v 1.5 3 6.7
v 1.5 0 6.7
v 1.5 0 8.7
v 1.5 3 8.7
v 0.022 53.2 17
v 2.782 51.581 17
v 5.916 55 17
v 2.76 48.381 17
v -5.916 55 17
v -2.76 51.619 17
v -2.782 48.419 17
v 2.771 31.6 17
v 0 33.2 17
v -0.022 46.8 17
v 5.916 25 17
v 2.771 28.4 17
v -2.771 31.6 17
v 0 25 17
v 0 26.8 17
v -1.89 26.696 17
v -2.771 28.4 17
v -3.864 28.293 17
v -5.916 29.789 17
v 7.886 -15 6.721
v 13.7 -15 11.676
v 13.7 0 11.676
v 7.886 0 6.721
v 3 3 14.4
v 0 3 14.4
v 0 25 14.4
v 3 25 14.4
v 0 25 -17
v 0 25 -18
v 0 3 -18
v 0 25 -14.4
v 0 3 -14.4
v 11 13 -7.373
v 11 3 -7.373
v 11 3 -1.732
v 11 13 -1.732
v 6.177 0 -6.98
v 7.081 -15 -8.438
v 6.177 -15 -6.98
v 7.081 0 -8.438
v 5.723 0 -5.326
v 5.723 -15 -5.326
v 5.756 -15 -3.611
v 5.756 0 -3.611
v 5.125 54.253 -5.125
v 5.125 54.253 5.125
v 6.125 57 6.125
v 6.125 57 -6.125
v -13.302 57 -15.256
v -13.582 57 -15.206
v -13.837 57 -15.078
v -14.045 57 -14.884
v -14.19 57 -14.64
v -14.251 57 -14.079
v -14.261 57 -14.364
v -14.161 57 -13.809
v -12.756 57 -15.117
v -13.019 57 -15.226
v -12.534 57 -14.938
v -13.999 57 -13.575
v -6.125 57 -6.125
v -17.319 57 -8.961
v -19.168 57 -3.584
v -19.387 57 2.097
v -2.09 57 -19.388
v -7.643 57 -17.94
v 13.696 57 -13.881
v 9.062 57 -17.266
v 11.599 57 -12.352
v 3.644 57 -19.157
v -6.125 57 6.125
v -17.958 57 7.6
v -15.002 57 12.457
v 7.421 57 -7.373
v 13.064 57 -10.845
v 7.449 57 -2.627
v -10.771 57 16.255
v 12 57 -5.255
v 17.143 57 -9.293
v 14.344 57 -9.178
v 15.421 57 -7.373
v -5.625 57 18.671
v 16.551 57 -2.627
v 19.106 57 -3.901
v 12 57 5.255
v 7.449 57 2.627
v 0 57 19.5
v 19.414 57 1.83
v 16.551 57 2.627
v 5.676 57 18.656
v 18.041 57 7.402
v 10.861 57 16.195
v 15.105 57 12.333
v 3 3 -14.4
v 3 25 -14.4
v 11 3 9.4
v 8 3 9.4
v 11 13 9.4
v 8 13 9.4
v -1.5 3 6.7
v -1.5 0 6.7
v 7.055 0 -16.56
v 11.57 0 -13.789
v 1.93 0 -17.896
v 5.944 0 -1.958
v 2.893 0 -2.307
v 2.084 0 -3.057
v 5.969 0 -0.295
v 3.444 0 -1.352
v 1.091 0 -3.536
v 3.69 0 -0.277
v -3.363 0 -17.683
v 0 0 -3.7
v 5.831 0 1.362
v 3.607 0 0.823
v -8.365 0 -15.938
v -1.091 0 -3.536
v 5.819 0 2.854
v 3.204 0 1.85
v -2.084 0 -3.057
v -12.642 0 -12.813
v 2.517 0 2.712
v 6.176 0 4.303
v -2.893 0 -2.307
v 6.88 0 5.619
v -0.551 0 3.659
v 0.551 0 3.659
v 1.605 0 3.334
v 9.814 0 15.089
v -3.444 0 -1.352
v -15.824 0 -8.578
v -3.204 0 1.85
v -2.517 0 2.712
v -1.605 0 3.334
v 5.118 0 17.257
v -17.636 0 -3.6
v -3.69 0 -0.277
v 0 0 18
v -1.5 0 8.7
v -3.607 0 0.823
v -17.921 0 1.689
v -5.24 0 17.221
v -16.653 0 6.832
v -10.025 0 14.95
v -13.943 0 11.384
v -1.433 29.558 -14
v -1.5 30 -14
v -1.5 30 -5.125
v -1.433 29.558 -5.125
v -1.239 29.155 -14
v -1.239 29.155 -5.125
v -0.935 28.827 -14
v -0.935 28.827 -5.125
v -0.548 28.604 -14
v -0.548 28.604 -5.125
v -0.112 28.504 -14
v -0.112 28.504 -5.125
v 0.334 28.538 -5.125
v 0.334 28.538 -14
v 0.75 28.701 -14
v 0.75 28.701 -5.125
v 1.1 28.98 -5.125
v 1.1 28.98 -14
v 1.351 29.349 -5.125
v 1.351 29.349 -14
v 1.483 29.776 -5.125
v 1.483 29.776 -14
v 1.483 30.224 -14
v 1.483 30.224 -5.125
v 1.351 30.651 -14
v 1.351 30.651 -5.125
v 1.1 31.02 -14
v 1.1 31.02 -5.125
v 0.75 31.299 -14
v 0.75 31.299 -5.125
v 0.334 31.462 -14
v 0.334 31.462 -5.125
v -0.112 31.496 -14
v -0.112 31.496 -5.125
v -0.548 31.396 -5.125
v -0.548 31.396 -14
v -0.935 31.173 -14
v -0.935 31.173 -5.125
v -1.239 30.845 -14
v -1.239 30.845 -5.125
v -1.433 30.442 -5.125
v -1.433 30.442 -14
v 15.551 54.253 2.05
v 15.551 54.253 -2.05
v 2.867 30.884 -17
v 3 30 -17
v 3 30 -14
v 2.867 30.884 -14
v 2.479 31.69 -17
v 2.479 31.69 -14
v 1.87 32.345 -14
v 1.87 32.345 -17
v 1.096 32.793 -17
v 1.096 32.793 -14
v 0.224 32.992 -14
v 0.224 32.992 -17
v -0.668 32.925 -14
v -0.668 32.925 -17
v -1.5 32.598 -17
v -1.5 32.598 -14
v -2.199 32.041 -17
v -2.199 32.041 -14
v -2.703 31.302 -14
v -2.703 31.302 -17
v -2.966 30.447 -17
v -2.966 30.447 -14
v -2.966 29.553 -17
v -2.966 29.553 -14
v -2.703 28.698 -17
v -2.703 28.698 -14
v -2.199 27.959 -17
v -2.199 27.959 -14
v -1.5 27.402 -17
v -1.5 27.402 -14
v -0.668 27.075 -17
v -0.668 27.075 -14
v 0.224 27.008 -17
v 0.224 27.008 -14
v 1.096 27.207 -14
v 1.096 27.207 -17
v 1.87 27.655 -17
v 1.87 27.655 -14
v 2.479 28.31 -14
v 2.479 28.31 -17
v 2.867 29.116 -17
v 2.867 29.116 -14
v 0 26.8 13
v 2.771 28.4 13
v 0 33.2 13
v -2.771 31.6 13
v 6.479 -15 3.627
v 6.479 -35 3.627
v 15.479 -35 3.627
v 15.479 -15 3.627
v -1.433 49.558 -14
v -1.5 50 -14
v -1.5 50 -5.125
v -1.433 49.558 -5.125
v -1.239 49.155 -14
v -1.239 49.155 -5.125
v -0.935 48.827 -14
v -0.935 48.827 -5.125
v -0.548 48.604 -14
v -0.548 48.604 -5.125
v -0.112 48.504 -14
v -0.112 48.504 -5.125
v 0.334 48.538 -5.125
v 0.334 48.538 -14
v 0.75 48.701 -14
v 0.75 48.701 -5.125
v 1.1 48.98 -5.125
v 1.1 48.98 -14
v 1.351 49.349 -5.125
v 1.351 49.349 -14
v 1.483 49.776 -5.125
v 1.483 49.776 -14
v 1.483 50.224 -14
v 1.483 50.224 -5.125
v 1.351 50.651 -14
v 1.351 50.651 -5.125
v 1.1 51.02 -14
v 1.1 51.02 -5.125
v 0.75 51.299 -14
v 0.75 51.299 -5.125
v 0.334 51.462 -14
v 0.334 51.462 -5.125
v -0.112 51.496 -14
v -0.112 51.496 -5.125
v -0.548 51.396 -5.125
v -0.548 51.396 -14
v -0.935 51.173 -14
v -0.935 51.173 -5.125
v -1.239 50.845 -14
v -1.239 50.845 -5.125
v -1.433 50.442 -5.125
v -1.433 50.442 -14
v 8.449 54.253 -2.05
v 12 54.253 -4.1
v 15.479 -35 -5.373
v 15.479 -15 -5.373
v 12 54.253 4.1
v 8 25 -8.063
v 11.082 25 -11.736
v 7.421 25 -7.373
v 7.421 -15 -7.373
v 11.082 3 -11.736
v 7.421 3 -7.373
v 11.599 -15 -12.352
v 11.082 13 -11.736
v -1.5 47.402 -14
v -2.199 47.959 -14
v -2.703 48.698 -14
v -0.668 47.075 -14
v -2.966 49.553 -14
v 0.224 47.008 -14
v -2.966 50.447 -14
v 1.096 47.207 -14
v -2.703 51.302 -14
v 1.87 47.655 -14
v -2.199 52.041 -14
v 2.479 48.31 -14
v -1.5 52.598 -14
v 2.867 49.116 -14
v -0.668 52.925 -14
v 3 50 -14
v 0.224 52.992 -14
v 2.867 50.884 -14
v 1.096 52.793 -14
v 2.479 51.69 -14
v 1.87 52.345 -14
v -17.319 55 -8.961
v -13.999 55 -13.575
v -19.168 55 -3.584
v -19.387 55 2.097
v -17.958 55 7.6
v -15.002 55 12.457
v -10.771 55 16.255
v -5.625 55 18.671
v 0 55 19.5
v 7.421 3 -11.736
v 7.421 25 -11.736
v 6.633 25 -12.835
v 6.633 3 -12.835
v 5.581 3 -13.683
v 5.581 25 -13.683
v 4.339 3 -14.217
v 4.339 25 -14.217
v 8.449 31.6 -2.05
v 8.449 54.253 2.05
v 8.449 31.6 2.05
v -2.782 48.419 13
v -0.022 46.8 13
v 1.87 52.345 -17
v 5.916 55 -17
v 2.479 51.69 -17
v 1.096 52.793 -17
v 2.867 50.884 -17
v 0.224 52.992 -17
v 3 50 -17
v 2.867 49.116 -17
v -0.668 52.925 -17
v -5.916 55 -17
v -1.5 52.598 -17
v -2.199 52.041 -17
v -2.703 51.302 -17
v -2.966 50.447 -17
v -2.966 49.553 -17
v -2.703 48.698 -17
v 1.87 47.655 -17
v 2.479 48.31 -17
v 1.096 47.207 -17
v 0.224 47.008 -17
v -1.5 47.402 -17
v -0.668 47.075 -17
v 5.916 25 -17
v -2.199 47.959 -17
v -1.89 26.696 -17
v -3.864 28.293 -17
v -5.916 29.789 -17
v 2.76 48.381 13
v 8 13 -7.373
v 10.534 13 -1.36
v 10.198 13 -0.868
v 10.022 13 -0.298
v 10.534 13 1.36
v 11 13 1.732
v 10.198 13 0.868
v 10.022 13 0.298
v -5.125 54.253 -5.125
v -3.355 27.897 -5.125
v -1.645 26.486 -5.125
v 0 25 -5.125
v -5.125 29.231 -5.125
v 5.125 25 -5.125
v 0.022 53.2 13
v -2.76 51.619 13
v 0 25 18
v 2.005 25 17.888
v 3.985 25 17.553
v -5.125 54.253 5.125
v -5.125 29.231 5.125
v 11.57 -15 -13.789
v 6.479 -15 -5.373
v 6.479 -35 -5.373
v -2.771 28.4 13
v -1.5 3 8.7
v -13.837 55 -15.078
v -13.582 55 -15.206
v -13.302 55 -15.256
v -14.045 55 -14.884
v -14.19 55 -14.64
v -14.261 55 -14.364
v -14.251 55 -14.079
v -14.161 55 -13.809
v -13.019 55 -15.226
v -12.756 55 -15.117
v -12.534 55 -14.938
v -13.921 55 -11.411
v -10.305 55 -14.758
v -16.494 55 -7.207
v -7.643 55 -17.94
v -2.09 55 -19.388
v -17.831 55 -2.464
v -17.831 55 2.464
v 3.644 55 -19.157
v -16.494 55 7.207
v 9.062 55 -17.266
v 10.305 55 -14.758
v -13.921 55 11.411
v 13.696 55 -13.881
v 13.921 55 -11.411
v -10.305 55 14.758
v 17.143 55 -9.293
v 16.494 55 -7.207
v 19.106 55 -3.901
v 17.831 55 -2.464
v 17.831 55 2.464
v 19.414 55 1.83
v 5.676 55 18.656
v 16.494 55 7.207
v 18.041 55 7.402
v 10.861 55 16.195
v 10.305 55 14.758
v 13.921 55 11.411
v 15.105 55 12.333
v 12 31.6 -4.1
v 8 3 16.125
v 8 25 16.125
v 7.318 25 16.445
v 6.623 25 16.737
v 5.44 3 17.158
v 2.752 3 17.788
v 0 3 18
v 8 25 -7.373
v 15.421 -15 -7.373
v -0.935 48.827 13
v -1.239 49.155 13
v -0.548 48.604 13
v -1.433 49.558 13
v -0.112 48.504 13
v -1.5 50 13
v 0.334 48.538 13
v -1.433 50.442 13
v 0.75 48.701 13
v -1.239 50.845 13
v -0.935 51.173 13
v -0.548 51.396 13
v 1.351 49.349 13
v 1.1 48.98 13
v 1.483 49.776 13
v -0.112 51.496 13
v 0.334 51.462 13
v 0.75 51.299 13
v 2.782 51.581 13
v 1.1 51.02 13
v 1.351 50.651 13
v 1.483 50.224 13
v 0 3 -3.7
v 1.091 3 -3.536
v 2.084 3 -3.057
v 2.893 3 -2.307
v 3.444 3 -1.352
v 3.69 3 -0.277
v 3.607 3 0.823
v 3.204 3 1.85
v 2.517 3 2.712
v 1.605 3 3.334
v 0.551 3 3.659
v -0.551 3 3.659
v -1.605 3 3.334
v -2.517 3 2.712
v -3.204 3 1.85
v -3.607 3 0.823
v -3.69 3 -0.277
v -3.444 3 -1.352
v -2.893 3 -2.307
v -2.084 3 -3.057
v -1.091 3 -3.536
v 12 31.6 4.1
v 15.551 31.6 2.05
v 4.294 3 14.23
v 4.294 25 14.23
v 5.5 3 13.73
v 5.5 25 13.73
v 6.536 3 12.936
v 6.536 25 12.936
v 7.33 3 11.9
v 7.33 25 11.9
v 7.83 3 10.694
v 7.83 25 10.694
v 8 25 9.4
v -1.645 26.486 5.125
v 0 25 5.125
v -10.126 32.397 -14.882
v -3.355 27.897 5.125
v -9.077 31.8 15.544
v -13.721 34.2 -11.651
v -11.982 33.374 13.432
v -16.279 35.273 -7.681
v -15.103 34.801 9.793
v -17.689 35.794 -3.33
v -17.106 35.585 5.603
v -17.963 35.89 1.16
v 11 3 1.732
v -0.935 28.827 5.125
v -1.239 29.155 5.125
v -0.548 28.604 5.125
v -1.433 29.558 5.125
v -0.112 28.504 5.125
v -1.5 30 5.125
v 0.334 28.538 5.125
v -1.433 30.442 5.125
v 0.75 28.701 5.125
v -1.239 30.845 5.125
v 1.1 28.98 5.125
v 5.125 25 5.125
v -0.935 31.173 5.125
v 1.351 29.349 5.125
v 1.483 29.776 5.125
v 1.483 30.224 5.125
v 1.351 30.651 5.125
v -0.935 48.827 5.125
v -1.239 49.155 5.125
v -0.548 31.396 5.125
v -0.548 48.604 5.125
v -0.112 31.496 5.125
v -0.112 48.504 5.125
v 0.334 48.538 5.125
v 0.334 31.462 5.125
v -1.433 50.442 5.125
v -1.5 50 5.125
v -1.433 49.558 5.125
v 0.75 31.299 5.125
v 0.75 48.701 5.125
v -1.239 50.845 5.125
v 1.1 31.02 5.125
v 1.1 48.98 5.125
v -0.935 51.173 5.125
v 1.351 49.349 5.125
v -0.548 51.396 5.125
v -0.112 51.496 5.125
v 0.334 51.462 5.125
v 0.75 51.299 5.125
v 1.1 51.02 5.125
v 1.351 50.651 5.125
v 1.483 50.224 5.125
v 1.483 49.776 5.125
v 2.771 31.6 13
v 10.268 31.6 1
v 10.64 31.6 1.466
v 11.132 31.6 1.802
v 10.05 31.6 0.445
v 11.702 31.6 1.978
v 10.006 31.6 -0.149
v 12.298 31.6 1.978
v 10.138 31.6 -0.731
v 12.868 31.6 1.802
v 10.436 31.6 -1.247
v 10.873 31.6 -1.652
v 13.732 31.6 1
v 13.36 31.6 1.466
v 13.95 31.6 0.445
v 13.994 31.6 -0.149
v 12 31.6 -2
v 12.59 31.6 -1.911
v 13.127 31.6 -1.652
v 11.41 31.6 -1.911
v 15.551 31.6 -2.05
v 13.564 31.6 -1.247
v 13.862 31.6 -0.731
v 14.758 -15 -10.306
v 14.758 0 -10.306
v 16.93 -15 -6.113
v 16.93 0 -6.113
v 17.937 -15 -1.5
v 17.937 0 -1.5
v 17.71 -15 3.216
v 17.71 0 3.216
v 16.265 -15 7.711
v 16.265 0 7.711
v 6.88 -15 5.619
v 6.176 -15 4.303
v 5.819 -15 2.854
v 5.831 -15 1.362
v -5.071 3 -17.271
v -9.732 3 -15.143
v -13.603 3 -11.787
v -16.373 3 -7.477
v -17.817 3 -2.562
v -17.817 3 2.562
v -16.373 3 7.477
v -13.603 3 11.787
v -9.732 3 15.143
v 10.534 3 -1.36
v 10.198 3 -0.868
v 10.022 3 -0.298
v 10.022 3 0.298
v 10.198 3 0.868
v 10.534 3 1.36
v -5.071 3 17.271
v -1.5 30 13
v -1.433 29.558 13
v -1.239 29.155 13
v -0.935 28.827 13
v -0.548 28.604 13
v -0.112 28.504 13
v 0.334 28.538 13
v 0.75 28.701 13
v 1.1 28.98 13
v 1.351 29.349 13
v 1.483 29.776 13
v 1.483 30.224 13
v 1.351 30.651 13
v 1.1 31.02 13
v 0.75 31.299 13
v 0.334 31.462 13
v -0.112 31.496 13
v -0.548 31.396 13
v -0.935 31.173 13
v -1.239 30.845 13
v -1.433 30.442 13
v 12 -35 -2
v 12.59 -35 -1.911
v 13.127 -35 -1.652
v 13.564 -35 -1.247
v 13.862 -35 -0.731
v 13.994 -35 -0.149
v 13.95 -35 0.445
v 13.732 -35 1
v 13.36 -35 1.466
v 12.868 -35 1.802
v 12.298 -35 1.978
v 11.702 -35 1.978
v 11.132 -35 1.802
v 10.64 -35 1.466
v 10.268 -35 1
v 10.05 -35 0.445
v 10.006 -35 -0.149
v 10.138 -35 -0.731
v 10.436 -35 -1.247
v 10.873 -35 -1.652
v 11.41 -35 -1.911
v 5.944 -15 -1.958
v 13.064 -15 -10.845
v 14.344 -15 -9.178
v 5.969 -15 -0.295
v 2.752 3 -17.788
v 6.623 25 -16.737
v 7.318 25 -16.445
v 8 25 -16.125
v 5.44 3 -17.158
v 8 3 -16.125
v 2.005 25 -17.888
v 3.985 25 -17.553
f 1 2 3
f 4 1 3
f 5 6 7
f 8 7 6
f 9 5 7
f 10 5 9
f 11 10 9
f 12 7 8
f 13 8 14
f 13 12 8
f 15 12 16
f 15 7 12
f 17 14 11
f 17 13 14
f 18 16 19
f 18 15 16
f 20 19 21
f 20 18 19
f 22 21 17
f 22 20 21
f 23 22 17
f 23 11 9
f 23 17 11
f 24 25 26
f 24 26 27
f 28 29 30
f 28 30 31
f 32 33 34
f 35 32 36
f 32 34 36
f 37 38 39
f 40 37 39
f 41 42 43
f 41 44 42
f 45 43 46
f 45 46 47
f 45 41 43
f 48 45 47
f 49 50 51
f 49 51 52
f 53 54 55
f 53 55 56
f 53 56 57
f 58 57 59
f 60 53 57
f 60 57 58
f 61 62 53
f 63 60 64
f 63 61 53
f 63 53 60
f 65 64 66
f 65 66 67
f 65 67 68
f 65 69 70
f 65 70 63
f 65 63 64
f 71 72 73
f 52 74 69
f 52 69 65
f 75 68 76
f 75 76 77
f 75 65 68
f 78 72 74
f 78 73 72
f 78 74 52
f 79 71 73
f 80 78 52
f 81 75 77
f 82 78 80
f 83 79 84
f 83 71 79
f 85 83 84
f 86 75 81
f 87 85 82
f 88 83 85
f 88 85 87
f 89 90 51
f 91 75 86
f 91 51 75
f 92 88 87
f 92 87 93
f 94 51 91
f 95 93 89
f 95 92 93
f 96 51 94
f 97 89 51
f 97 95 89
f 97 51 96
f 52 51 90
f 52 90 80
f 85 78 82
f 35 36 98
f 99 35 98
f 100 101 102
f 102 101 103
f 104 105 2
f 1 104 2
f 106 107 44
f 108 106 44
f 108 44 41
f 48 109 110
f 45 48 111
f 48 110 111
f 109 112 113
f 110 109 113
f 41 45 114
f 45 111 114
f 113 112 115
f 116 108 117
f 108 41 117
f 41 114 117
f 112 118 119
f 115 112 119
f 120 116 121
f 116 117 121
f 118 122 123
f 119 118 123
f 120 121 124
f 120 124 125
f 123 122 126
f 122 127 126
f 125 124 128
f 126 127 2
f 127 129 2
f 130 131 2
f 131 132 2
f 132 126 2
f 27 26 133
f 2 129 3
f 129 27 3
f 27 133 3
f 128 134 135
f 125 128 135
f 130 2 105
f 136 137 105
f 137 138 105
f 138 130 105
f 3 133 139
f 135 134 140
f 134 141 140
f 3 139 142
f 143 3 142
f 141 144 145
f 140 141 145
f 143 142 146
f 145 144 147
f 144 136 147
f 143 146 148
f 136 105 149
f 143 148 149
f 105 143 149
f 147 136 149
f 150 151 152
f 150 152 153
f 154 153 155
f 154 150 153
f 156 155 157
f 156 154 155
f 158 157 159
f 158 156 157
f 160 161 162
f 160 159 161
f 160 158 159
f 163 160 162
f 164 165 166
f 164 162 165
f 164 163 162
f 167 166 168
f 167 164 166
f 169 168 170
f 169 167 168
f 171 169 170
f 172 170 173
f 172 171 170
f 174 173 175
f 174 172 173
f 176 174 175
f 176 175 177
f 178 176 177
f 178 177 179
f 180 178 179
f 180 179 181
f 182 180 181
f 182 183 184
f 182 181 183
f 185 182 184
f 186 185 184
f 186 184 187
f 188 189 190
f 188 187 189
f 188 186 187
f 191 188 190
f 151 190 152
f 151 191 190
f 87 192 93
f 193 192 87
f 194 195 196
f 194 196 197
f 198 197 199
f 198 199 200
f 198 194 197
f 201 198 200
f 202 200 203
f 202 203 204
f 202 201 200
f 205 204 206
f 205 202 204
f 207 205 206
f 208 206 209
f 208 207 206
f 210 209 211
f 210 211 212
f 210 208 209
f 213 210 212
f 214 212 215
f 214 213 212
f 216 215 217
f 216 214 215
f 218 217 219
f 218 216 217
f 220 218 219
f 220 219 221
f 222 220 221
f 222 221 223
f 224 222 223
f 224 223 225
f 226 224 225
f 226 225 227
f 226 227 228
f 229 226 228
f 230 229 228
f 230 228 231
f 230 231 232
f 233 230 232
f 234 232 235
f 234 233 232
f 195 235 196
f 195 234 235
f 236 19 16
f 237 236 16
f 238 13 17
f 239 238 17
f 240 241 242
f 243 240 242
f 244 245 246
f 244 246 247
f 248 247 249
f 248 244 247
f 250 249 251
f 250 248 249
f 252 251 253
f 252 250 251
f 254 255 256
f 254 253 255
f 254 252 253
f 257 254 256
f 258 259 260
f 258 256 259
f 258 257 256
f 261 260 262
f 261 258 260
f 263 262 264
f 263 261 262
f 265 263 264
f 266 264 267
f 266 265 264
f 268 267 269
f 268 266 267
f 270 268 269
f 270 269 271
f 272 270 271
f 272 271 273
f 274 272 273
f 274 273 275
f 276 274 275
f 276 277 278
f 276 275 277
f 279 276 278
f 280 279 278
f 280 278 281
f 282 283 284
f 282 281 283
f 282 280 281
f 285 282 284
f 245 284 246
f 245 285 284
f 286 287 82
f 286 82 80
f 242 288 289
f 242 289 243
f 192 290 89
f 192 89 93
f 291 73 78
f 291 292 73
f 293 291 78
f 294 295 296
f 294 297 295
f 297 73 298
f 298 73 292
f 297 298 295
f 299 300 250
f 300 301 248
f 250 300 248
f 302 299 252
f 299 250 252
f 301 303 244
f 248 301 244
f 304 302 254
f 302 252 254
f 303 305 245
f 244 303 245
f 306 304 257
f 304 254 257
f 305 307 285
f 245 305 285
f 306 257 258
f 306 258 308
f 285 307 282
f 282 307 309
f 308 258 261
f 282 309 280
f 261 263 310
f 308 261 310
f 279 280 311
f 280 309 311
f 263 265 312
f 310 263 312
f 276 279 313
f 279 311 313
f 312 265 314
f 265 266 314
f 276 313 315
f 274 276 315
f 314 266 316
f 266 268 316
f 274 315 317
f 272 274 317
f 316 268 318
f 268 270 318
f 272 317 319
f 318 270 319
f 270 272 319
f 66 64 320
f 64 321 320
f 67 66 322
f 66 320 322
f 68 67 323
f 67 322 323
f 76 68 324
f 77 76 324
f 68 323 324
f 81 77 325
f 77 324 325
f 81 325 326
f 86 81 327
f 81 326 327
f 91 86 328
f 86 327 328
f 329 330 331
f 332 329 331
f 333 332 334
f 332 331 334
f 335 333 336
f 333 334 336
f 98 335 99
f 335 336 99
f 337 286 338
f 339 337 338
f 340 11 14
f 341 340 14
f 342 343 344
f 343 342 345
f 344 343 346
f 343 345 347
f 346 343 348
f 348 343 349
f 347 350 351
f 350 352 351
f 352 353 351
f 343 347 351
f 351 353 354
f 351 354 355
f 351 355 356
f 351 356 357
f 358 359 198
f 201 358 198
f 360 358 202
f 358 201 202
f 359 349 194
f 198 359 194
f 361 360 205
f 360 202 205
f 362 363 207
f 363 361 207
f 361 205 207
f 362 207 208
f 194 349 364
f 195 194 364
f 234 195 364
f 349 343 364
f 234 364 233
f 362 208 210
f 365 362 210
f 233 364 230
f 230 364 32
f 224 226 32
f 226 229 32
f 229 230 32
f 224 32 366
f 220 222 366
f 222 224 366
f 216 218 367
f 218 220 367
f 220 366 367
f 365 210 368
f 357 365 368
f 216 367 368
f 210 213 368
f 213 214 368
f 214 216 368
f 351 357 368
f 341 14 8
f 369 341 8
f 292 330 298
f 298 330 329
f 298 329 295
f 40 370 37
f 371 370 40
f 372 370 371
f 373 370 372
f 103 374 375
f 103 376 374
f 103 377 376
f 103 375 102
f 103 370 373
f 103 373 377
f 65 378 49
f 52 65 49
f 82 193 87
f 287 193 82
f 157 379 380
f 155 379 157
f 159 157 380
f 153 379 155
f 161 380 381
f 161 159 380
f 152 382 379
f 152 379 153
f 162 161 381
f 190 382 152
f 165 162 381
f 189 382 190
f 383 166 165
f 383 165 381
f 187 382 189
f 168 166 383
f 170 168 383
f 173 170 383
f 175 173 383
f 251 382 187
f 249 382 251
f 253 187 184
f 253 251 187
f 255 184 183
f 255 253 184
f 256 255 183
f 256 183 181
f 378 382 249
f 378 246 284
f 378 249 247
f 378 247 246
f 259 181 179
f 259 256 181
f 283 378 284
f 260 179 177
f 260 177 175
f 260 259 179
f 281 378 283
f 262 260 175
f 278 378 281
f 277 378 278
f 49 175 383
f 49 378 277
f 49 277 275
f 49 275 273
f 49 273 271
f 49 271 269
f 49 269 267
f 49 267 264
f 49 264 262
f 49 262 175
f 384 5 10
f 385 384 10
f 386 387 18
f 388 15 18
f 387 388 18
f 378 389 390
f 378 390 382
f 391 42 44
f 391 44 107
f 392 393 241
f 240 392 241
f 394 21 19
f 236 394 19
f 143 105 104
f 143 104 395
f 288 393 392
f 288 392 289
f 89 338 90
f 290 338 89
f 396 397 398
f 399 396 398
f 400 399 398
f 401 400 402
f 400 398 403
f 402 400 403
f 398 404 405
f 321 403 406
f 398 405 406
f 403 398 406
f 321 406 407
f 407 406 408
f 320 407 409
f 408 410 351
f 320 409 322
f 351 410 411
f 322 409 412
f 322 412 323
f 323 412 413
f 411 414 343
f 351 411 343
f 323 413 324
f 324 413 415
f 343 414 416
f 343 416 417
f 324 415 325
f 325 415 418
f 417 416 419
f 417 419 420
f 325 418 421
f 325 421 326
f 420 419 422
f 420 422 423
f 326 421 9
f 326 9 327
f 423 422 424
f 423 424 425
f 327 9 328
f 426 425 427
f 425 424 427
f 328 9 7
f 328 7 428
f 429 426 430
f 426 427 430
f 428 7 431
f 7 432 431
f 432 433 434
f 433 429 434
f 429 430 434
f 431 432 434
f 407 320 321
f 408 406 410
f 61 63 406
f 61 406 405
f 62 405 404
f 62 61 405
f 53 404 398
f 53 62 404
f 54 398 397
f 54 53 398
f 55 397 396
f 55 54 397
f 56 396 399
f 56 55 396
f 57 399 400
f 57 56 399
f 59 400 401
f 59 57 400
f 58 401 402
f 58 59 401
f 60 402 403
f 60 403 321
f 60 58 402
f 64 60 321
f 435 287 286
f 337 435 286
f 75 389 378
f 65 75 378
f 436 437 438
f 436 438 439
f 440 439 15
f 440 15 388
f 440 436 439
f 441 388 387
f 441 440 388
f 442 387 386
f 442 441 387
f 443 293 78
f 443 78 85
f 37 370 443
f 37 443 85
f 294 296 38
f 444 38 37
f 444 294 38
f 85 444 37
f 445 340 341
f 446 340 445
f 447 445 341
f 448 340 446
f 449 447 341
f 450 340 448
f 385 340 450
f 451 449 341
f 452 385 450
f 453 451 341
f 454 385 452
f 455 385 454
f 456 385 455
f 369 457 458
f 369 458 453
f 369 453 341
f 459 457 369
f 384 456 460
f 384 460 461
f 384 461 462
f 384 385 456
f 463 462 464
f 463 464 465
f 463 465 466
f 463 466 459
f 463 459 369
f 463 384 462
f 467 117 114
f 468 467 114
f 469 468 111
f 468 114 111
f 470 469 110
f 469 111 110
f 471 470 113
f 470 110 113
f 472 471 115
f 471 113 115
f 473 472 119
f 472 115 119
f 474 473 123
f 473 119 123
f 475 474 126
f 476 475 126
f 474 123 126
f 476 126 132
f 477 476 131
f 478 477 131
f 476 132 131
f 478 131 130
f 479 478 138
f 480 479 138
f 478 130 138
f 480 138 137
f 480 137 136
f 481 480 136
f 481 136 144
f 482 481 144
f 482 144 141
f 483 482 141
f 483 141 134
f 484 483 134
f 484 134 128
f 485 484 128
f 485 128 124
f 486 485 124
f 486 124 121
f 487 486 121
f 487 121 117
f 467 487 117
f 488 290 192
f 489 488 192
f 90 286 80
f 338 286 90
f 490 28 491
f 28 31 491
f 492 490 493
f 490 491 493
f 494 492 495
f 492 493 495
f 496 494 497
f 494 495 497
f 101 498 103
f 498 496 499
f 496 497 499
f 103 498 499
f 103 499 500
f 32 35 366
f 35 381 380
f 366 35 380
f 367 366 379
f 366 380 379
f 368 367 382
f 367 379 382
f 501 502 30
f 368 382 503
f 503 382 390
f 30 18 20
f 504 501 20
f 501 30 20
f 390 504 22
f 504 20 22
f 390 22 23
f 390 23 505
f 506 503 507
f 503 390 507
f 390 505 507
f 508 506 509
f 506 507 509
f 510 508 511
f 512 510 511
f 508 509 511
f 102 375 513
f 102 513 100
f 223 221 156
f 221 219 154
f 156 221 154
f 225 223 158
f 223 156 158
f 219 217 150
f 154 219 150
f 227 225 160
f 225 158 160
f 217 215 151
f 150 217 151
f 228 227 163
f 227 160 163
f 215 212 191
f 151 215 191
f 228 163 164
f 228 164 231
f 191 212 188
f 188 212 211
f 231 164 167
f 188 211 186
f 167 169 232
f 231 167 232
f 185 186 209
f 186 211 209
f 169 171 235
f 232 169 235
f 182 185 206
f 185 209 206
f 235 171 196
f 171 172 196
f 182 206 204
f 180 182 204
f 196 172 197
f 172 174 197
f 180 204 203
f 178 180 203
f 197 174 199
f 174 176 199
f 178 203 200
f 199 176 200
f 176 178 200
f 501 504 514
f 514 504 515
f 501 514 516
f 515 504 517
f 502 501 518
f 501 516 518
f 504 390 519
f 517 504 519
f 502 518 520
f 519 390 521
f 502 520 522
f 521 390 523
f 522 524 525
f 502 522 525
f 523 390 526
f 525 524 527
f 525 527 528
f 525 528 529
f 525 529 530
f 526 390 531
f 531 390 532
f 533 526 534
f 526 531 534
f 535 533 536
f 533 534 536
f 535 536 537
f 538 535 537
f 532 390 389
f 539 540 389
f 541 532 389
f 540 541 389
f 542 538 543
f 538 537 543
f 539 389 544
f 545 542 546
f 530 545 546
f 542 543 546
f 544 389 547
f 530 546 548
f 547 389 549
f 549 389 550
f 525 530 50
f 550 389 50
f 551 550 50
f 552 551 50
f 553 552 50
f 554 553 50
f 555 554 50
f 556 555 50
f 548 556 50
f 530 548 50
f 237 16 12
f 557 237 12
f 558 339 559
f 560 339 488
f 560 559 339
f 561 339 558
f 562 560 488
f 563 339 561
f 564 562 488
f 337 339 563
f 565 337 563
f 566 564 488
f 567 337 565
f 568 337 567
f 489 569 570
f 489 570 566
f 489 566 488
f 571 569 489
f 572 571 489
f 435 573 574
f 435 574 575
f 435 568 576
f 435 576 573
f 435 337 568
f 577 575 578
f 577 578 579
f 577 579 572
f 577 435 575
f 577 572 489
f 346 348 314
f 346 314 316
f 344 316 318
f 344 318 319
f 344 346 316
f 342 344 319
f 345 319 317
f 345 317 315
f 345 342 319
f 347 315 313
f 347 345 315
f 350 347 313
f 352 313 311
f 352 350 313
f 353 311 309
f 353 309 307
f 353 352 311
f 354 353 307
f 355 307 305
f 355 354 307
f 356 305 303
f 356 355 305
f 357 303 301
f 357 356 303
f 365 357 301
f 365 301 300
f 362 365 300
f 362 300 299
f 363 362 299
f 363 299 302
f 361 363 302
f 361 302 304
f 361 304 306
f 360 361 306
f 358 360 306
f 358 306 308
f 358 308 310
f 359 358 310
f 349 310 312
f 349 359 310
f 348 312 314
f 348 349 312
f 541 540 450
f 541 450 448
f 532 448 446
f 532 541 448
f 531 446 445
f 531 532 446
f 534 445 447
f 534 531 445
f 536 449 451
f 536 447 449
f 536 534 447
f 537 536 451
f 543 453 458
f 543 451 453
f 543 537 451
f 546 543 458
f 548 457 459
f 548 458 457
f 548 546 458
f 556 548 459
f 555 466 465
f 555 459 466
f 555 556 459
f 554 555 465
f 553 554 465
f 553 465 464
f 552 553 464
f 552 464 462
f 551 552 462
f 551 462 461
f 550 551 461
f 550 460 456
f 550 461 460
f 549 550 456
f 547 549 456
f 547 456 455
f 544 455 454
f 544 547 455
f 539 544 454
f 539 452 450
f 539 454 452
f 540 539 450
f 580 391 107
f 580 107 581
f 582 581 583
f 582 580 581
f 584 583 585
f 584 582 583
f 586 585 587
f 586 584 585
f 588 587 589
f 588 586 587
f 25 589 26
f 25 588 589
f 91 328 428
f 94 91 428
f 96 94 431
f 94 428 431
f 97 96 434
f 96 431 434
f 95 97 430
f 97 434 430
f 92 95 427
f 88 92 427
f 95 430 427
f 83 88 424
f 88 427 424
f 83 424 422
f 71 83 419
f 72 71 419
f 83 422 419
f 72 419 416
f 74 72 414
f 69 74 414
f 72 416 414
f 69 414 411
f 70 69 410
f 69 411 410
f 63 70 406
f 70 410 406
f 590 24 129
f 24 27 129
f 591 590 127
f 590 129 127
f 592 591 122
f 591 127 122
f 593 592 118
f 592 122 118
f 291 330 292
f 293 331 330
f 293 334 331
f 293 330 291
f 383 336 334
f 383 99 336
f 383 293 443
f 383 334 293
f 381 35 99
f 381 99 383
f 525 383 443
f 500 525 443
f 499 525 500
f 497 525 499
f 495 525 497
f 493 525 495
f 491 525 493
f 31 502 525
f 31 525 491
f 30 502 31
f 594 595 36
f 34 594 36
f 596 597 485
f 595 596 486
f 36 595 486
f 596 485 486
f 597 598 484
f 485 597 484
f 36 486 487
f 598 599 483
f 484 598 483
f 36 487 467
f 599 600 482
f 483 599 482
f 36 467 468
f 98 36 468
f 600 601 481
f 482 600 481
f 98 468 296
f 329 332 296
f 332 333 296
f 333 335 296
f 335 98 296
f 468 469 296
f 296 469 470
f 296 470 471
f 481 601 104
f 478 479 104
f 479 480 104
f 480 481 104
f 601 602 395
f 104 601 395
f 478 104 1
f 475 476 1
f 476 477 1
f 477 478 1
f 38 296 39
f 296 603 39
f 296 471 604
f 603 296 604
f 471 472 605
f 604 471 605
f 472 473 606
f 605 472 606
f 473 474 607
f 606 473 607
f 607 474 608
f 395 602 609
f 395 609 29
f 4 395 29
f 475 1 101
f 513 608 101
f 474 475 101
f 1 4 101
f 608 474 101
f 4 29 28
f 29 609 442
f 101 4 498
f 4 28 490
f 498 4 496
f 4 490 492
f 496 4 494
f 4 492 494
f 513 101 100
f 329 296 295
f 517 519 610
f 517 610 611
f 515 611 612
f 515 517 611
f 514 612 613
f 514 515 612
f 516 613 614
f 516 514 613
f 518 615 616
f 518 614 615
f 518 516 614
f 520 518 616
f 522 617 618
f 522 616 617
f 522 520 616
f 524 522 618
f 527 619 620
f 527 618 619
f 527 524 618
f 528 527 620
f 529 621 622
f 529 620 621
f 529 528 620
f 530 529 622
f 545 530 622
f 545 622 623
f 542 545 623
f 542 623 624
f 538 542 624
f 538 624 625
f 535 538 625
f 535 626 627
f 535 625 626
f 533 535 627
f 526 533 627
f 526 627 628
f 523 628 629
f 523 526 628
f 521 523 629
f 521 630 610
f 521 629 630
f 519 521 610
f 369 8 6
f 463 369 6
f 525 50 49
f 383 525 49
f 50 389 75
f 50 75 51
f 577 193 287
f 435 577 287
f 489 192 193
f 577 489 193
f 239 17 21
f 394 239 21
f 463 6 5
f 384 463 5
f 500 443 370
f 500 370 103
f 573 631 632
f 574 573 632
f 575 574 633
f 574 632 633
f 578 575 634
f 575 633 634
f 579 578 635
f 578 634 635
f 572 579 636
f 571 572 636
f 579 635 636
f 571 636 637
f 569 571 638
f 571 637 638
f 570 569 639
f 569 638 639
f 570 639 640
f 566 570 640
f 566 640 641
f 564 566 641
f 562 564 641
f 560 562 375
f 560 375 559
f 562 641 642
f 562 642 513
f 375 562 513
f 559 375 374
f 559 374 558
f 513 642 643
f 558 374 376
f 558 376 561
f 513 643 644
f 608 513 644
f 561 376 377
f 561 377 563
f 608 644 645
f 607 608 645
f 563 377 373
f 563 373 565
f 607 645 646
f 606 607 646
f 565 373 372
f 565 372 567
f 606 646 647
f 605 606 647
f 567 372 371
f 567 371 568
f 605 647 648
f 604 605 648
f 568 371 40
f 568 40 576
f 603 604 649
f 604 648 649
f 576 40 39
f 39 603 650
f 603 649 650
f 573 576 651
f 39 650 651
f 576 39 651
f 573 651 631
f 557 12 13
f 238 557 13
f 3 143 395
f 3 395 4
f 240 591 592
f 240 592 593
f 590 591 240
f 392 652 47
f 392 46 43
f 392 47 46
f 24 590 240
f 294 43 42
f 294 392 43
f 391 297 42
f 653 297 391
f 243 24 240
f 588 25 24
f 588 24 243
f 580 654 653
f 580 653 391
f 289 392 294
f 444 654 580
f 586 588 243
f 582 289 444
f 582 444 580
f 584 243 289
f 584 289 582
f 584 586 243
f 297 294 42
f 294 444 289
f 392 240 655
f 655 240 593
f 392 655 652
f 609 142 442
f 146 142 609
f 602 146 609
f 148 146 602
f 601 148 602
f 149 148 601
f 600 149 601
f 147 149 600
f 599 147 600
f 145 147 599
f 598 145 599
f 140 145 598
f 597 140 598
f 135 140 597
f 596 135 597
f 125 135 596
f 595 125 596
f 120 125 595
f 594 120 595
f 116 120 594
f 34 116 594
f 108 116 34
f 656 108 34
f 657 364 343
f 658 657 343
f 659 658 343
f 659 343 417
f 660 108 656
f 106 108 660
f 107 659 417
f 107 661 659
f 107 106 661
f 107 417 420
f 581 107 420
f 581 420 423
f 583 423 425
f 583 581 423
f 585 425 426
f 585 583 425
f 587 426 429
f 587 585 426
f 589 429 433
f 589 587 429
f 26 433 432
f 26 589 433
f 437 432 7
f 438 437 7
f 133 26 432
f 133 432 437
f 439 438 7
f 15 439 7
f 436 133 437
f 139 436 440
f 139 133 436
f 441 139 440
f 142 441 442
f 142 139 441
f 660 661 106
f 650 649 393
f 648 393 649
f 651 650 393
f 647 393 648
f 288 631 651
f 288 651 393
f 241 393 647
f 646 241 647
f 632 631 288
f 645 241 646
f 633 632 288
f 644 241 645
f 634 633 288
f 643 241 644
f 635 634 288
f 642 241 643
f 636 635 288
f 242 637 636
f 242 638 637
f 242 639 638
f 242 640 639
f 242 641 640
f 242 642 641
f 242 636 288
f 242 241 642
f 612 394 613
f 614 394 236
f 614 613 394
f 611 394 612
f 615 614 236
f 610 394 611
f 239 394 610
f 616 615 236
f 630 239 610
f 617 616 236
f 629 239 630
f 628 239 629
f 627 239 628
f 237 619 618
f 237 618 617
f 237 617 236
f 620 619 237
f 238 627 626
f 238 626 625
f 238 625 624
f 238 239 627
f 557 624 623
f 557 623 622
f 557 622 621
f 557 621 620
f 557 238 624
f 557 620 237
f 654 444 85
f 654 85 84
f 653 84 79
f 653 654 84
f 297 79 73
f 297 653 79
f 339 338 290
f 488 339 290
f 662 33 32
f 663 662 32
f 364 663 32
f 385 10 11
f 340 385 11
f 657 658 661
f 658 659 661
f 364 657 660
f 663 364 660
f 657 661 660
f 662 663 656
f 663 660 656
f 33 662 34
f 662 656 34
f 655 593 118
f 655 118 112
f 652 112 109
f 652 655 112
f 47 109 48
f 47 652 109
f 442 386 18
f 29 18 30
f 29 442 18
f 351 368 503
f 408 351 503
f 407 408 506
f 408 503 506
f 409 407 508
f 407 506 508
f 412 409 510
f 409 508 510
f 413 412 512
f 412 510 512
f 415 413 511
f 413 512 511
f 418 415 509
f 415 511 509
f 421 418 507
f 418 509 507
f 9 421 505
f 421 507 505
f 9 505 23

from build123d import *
from build123d.topology import SkipClean

# Parameters (mm, degrees)
SKETCH_1_R          = 18
EXTRUDE_1_DEPTH     = 55
SKETCH_2_R          = 19.5
EXTRUDE_2_DEPTH     = 2
SKETCH_3_W          = 10.25
SKETCH_3_H          = 10.25
CUT_EXTRUDE_1_DEPTH = 40
EXTRUDE_START       = 15
EXTRUDE_3_DEPTH     = 15
BOSS_EXTRUDE1_START = 20
SKETCH1_R           = 18
BOSS_EXTRUDE1_DEPTH = 20
BOSS_EXTRUDE2_START = 7
SKETCH3_R           = 18
BOSS_EXTRUDE2_DEPTH = 7
SKETCH4_W           = 10.2
SKETCH4_H           = 10.2
CUT_EXTRUDE2_DEPTH  = 27
CUT_EXTRUDE4_DEPTH  = 25
BOSS_EXTRUDE3_DEPTH = 3
SKETCH9_W           = 36
SKETCH9_H           = 22
CUT_EXTRUDE5_DEPTH  = 8
SKETCH10_R          = 3.7
SKETCH10_W          = 3
SKETCH10_H          = 2
CUT_EXTRUDE6_DEPTH  = 10
SKETCH11_R          = 2
CUT_EXTRUDE7_DEPTH  = 102
SKETCH15_R          = 18
CUT_EXTRUDE9_DEPTH  = 27
CUT_EXTRUDE11_DEPTH = 30
SKETCH18_R          = 1.5
CUT_EXTRUDE12_DEPTH = 71.437915926
SKETCH19_R          = 3
CUT_EXTRUDE13_DEPTH = 3
BOSS_EXTRUDE5_DEPTH = 22
CUT_EXTRUDE16_DEPTH = 4
CUT_EXTRUDE17_DEPTH = 25.4
CUT_EXTRUDE18_DEPTH = 71.437915926
FILLET2_R           = 5
SKETCH30_W          = 18.8
SKETCH30_H          = 10
CUT_EXTRUDE20_DEPTH = 3
CHAMFER1_SIZE       = 1
CHAMFER1_SIZE2      = 2.747477419
CHAMFER2_SIZE       = 1
CHAMFER2_SIZE2      = 2.747477419
BOSS_EXTRUDE7_START = 20
SKETCH37_W          = 9
SKETCH37_H          = 9
SKETCH37_R          = 2
BOSS_EXTRUDE7_DEPTH = 20
CUT_EXTRUDE22_DEPTH = 15
CUT_EXTRUDE23_DEPTH = 78.100583655
SKETCH40_W          = 4.363156696
SKETCH40_H          = 4.363156696
CUT_EXTRUDE24_DEPTH = 10
FILLET7_R           = 6
BOSS_EXTRUDE8_DEPTH = 2
CUT_EXTRUDE25_DEPTH = 12


with BuildPart() as part:
    # Эскиз1 → Бобышка-Вытянуть1 (new body)
    with BuildSketch(Plane(origin=(0, 0, 0), x_dir=(1, 0, 0), z_dir=(0, 1, 0))):
        with Locations(Location((0, 0, 0), (0, 0, 270))):
            Circle(SKETCH_1_R)
    extrude(amount=EXTRUDE_1_DEPTH)

    # Эскиз2 → Бобышка-Вытянуть2 (add)
    with BuildSketch(Plane(origin=(0, 55, 0), x_dir=(1, 0, 0), z_dir=(0, 1, 0))):
        with Locations(Location((0, 0, 0), (0, 0, 270))):
            Circle(SKETCH_2_R)
    extrude(amount=EXTRUDE_2_DEPTH)

    # Эскиз3 → Вырез-Вытянуть1 (cut)
    with BuildSketch(Plane(origin=(0, 57, 0), x_dir=(1, 0, 0), z_dir=(0, 1, 0))):
        Rectangle(SKETCH_3_W, SKETCH_3_H)
    extrude(amount=-CUT_EXTRUDE_1_DEPTH, mode=Mode.SUBTRACT)

    # Эскиз4 → Бобышка-Вытянуть3 (add)
    with SkipClean():  # the faces are left unmerged after this step: merging them gives an invalid solid
        with BuildSketch(Plane.XZ.offset(EXTRUDE_START)):
            with BuildLine():
                Line((5.142300877, -6.128355545), (11.570176974, -13.788799976))
                ThreePointArc((11.570176974, -13.788799976), (17.937391115, -1.5), (13.69961987, 11.675633406))
                Line((13.69961987, 11.675633406), (5.142300877, 4.38257561))
                Line((5.142300877, 4.38257561), (5.142300877, -6.128355545))
            make_face()
        extrude(amount=-EXTRUDE_3_DEPTH)

    # Sketch1 → Boss-Extrude1 (add)
    with BuildSketch(Plane.XZ.offset(15).offset(BOSS_EXTRUDE1_START)):
        with Locations(Location((0, 0, 0), (0, 0, 270))):
            Circle(SKETCH1_R)
    extrude(amount=-BOSS_EXTRUDE1_DEPTH)

    # Sketch3 → Boss-Extrude2 (add)
    with BuildSketch(Plane.XZ.offset(35).offset(BOSS_EXTRUDE2_START)):
        with Locations(Location((0, 0, 0), (0, 0, 270))):
            Circle(SKETCH3_R)
    extrude(amount=-BOSS_EXTRUDE2_DEPTH)

    # Sketch4 → Cut-Extrude2 (cut)
    with BuildSketch(Plane.XZ.offset(42)):
        Rectangle(SKETCH4_W, SKETCH4_H)
    extrude(amount=-CUT_EXTRUDE2_DEPTH, mode=Mode.SUBTRACT)

    # Sketch6 → Cut-Extrude4 (cut)
    with BuildSketch(Plane.XZ):
        with BuildLine():
            Line((0, 18), (0, -18))
            ThreePointArc((0, -18), (-18, 0), (0, 18))
        make_face()
    extrude(amount=-CUT_EXTRUDE4_DEPTH, mode=Mode.SUBTRACT)

    # Sketch8 → Boss-Extrude3 (add)
    with BuildSketch(Plane.XZ):
        with BuildLine():
            Line((0, -18), (0, 18))
            ThreePointArc((0, 18), (-18, 0), (0, -18))
        make_face()
    extrude(amount=-BOSS_EXTRUDE3_DEPTH)

    # Sketch9 → Cut-Extrude5 (cut)
    with BuildSketch(Plane.ZY):
        with Locations((0, 14)):
            Rectangle(SKETCH9_W, SKETCH9_H)
    extrude(amount=-CUT_EXTRUDE5_DEPTH, mode=Mode.SUBTRACT)

    # Sketch10 → Cut-Extrude6 (cut)
    with BuildSketch(Plane.XZ):
        with Locations(Location((0, 0, 0), (0, 0, 270))):
            Circle(SKETCH10_R)
        with Locations((0, 7.7)):
            Rectangle(SKETCH10_W, SKETCH10_H)
    extrude(amount=-CUT_EXTRUDE6_DEPTH, mode=Mode.SUBTRACT)

    # Sketch11 → Cut-Extrude7 (cut)
    with BuildSketch(Plane.XZ.offset(42)):
        with Locations(Location((12, 0, 0), (0, 0, 270))):
            Circle(SKETCH11_R)
    extrude(amount=-CUT_EXTRUDE7_DEPTH, mode=Mode.SUBTRACT)

    # Sketch15 → Cut-Extrude9 (cut)
    with BuildSketch(Plane.XZ.offset(42)):
        with Locations(Location((0, 0, 0), (0, 0, 310))):
            Circle(SKETCH15_R)
    extrude(amount=-CUT_EXTRUDE9_DEPTH, mode=Mode.SUBTRACT)

    # Sketch17 → Cut-Extrude11 (cut)
    with BuildSketch(Plane.XZ.offset(-25)):
        with BuildLine():
            Line((5.916079783, -17), (-5.916079783, -17))
            ThreePointArc((-5.916079783, -17), (0, -18), (5.916079783, -17))
        make_face()
        with BuildLine():
            Line((5.916079783, 17), (-5.916079783, 17))
            ThreePointArc((-5.916079783, 17), (0, 18), (5.916079783, 17))
        make_face()
    extrude(amount=-CUT_EXTRUDE11_DEPTH, mode=Mode.SUBTRACT)

    # Sketch18 → Cut-Extrude12 (cut, through all)
    with BuildSketch(Plane.XY.offset(-17)):
        with Locations(Location((0, 30, 0), (0, 0, 180))):
            Circle(SKETCH18_R)
        with Locations(Location((0, 50, 0), (0, 0, 180))):
            Circle(SKETCH18_R)
    extrude(amount=CUT_EXTRUDE12_DEPTH, mode=Mode.SUBTRACT)

    # Sketch19 → Cut-Extrude13 (cut)
    with BuildSketch(Plane.XY.offset(-17)):
        with Locations((0, 30)):
            Circle(SKETCH19_R)
        with Locations((0, 50)):
            Circle(SKETCH19_R)
    extrude(amount=CUT_EXTRUDE13_DEPTH, mode=Mode.SUBTRACT)

    # Sketch23 → Boss-Extrude5 (add)
    with BuildSketch(Plane(origin=(0, 3, 0), x_dir=(1, 0, 0), z_dir=(0, 1, 0))):
        with BuildLine():
            Line((0, -14.4), (8, -14.4))
            Line((8, -14.4), (8, -16.124515497))
            ThreePointArc((8, -16.124515497), (4.108449894, -17.524857759), (0, -18))
            Line((0, -18), (0, -14.4))
        make_face()
        with BuildLine():
            Line((0, 14.4), (8, 14.4))
            Line((8, 14.4), (8, 16.124515497))
            ThreePointArc((8, 16.124515497), (4.108449894, 17.524857759), (0, 18))
            Line((0, 18), (0, 14.4))
        make_face()
    extrude(amount=BOSS_EXTRUDE5_DEPTH)

    # Sketch25 → Cut-Extrude16 (cut)
    with BuildSketch(Plane.XY.offset(17)):
        Polygon((2.771281292, 28.4), (2.771281292, 31.6), (0, 33.2), (-2.771281292, 31.6), (-2.771281292, 28.4), (0, 26.8), align=None)
        Polygon((-2.782126929, 48.418933983), (-0.021820128, 46.800074394), (2.760306801, 48.381140412), (2.782126929, 51.581066017), (0.021820128, 53.199925606), (-2.760306801, 51.618859588), align=None)
    extrude(amount=-CUT_EXTRUDE16_DEPTH, mode=Mode.SUBTRACT)

    # Sketch26 → Cut-Extrude17 (cut)
    with BuildSketch(Plane(origin=(0, 57, 0), x_dir=(1, 0, 0), z_dir=(0, 1, 0))):
        Polygon((8.449295844, -2.05), (12, -4.1), (15.550704156, -2.05), (15.550704156, 2.05), (12, 4.1), (8.449295844, 2.05), align=None)
    extrude(amount=-CUT_EXTRUDE17_DEPTH, mode=Mode.SUBTRACT)

    # Sketch27 → Cut-Extrude18 (cut, through all)
    with BuildSketch(Plane.XY.offset(17)):
        with BuildLine():
            Line((-20, 36.547005384), (-20, 25))
            Line((-20, 25), (0, 25))
            ThreePointArc((0, 25), (-9.324199199, 31.944024015), (-20, 36.547005384))
        make_face()
    extrude(amount=-CUT_EXTRUDE18_DEPTH, mode=Mode.SUBTRACT)

    # Fillet2
    fillet2_edges = [part.edges().sort_by_distance(p)[0] for p in [
        (8, 14, -14.4),
        (8, 14, 14.4),
    ]]
    fillet(fillet2_edges, radius=FILLET2_R)

    # Sketch30 → Cut-Extrude20 (cut)
    with BuildSketch(Plane.ZY.offset(-8)):
        with Locations((0, 8)):
            Rectangle(SKETCH30_W, SKETCH30_H)
    extrude(amount=-CUT_EXTRUDE20_DEPTH, mode=Mode.SUBTRACT)

    # Chamfer1
    chamfer1_edges = [part.edges().sort_by_distance(p)[0] for p in [
        (5.125, 57, 0),
        (0, 57, -5.125),
        (-5.125, 57, 0),
        (0, 57, 5.125),
    ]]
    chamfer1_side = [part.faces().sort_by_distance(p)[0] for p in [
        (0, 57, -18.948456711),
    ]]
    chamfer(chamfer1_edges, length=CHAMFER1_SIZE, length2=CHAMFER1_SIZE2, reference=chamfer1_side[0])

    # Chamfer2
    chamfer2_edges = [part.edges().sort_by_distance(p)[0] for p in [
        (8.449295844, 57, 0),
        (10.224647922, 57, 3.075),
        (13.775352078, 57, 3.075),
        (15.550704156, 57, 0),
        (13.775352078, 57, -3.075),
        (10.224647922, 57, -3.075),
    ]]
    chamfer2_side = [part.faces().sort_by_distance(p)[0] for p in [
        (6.676543289, 57, 0),
    ]]
    chamfer(chamfer2_edges, length=CHAMFER2_SIZE, length2=CHAMFER2_SIZE2, reference=chamfer2_side[0])

    # Sketch37 → Boss-Extrude7 (add)
    with BuildSketch(Plane.XZ.offset(15).offset(BOSS_EXTRUDE7_START)):
        with Locations((10.978822628, -0.872889968)):
            Rectangle(SKETCH37_W, SKETCH37_H)
        with Locations(Location((12, 0, 0), (0, 0, 270))):
            Circle(SKETCH37_R, mode=Mode.SUBTRACT)
    extrude(amount=-BOSS_EXTRUDE7_DEPTH)

    # Sketch38 → Cut-Extrude22 (cut)
    with BuildSketch(Plane.XZ.offset(15)):
        with BuildLine():
            Line((5.142300877, -6.128355545), (5.142300877, 4.38257561))
            ThreePointArc((5.142300877, 4.38257561), (5.978822628, -0.872889968), (5.142300877, -6.128355545))
        make_face()
    extrude(amount=-CUT_EXTRUDE22_DEPTH, mode=Mode.SUBTRACT)

    # Sketch39 → Cut-Extrude23 (cut, through all)
    with BuildSketch(Plane.XZ.offset(15)):
        with BuildLine():
            Line((7.420733648, -7.372889968), (15.420733648, -7.372889968))
            ThreePointArc((15.420733648, -7.372889968), (13.728515389, -10.030415688), (11.598853111, -12.352178848))
            Line((11.598853111, -12.352178848), (7.420733648, -7.372889968))
        make_face()
    extrude(amount=-CUT_EXTRUDE23_DEPTH, mode=Mode.SUBTRACT)

    # Sketch40 → Cut-Extrude24 (cut)
    with BuildSketch(Plane(origin=(0, 3, 0), x_dir=(1, 0, 0), z_dir=(0, 1, 0))):
        with Locations((9.602311996, 9.554468316)):
            Rectangle(SKETCH40_W, SKETCH40_H)
    extrude(amount=CUT_EXTRUDE24_DEPTH, mode=Mode.SUBTRACT)

    # Fillet7
    fillet7_edges = [part.edges().sort_by_distance(p)[0] for p in [
        (5.142300877, -7.5, 4.38257561),
        (5.142300877, -7.5, -6.128355545),
    ]]
    fillet(fillet7_edges, radius=FILLET7_R)

    # Sketch41 → Boss-Extrude8 (add)
    with BuildSketch(Plane(origin=(0, 57, 0), x_dir=(1, 0, 0), z_dir=(0, 1, 0))):
        with BuildLine():
            Line((-13.998504433, 13.575414308), (-12.534358389, 14.937866641))
            ThreePointArc((-12.534358389, 14.937866641), (-13.947657578, 14.988713497), (-13.998504433, 13.575414308))
        make_face()
    extrude(amount=-BOSS_EXTRUDE8_DEPTH)

    # Sketch42 → Cut-Extrude25 (cut)
    with BuildSketch(Plane.XZ.offset(-13)):
        Polygon((8, -8.063232724), (7.420733648, -11.736046664), (11.081856822, -11.736046664), align=None)
    extrude(amount=-CUT_EXTRUDE25_DEPTH, mode=Mode.SUBTRACT)


solid = part.part
